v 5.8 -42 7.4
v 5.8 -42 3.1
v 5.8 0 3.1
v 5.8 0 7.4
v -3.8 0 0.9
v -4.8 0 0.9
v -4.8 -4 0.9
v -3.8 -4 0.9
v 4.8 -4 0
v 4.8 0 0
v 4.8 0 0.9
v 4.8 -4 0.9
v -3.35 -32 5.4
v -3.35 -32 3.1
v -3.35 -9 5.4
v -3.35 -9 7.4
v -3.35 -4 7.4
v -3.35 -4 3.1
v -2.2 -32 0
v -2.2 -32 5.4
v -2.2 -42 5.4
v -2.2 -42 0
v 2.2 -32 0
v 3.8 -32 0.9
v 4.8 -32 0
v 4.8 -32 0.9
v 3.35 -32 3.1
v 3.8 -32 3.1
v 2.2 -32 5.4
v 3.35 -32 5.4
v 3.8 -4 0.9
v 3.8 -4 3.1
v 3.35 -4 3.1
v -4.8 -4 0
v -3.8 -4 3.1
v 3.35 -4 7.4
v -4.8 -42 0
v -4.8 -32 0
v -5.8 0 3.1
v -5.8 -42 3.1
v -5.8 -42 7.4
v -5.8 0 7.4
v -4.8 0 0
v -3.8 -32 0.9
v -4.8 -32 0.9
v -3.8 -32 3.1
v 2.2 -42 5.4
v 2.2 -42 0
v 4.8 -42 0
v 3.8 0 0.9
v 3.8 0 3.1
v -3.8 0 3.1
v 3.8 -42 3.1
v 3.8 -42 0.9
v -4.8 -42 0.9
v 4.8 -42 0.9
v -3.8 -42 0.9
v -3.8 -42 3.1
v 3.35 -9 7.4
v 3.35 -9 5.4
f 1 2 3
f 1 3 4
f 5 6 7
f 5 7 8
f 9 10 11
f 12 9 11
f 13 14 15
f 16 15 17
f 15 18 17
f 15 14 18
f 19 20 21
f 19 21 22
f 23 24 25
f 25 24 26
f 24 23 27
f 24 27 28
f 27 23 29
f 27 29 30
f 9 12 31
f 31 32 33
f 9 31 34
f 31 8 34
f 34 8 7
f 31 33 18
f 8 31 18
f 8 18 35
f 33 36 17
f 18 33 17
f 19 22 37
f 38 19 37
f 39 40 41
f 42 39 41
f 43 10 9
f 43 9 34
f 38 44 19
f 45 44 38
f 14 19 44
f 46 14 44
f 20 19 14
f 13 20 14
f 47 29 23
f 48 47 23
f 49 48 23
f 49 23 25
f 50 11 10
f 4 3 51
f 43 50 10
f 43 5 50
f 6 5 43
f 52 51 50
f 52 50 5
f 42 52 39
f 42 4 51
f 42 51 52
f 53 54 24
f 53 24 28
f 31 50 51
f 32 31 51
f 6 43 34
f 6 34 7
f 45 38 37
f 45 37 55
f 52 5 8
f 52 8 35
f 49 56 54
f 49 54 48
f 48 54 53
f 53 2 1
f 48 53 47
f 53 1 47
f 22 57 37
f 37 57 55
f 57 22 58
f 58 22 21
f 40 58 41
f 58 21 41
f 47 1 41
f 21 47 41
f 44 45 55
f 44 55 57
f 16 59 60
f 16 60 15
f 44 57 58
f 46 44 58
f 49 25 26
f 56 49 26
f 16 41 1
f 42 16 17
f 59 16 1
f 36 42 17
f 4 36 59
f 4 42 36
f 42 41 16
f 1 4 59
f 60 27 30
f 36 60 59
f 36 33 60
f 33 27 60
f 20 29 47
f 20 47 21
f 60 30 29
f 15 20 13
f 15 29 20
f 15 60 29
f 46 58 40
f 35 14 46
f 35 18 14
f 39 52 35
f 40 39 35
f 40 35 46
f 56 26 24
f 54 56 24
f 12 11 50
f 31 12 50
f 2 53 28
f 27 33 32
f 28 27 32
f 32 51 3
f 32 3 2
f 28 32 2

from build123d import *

# Parameters (mm, degrees)
PAD_DEPTH    = 4
SKETCH001_W  = 2.45
SKETCH001_H  = 4.3
PAD001_DEPTH = 5
PAD002_DEPTH = 23
PAD003_DEPTH = 10


with BuildPart() as part:
    # Sketch → Pad (new body)
    with BuildSketch(Plane.XZ):
        Polygon((0, 0), (4.8, 0), (4.8, 0.9), (3.8, 0.9), (3.8, 3.1), (5.8, 3.1), (5.8, 7.4), (0, 7.4), align=None)
    pad = extrude(amount=PAD_DEPTH)

    # Sketch001 → Pad001 (join)
    with BuildSketch(Plane.XZ.offset(4)):
        with Locations((4.575, 5.25)):
            Rectangle(SKETCH001_W, SKETCH001_H)
    pad001 = extrude(amount=PAD001_DEPTH)

    # Sketch002 → Pad002 (join)
    with BuildSketch(Plane.XZ.offset(9)):
        Polygon((5.8, 7.4), (0, 7.4), (0, 5.4), (3.35, 5.4), (3.35, 3.1), (5.8, 3.1), align=None)
    pad002 = extrude(amount=PAD002_DEPTH)

    # Sketch003 → Pad003 (join)
    with BuildSketch(Plane.XZ.offset(32)):
        Polygon((4.8, 0), (4.8, 0.9), (3.8, 0.9), (3.8, 3.1), (5.8, 3.1), (5.8, 7.4), (0, 7.4), (0, 5.4), (2.2, 5.4), (2.2, 0), align=None)
    pad003 = extrude(amount=PAD003_DEPTH)

    # Mirrored: Pad, Pad001, Pad002, Pad003 across Sketch V_Axis
    add(pad.mirror(Plane(origin=(0, 0, 0), x_dir=(0, -1, 0), z_dir=(1, 0, 0))))
    add(pad001.mirror(Plane(origin=(0, 0, 0), x_dir=(0, -1, 0), z_dir=(1, 0, 0))))
    add(pad002.mirror(Plane(origin=(0, 0, 0), x_dir=(0, -1, 0), z_dir=(1, 0, 0))))
    add(pad003.mirror(Plane(origin=(0, 0, 0), x_dir=(0, -1, 0), z_dir=(1, 0, 0))))


solid = part.part
